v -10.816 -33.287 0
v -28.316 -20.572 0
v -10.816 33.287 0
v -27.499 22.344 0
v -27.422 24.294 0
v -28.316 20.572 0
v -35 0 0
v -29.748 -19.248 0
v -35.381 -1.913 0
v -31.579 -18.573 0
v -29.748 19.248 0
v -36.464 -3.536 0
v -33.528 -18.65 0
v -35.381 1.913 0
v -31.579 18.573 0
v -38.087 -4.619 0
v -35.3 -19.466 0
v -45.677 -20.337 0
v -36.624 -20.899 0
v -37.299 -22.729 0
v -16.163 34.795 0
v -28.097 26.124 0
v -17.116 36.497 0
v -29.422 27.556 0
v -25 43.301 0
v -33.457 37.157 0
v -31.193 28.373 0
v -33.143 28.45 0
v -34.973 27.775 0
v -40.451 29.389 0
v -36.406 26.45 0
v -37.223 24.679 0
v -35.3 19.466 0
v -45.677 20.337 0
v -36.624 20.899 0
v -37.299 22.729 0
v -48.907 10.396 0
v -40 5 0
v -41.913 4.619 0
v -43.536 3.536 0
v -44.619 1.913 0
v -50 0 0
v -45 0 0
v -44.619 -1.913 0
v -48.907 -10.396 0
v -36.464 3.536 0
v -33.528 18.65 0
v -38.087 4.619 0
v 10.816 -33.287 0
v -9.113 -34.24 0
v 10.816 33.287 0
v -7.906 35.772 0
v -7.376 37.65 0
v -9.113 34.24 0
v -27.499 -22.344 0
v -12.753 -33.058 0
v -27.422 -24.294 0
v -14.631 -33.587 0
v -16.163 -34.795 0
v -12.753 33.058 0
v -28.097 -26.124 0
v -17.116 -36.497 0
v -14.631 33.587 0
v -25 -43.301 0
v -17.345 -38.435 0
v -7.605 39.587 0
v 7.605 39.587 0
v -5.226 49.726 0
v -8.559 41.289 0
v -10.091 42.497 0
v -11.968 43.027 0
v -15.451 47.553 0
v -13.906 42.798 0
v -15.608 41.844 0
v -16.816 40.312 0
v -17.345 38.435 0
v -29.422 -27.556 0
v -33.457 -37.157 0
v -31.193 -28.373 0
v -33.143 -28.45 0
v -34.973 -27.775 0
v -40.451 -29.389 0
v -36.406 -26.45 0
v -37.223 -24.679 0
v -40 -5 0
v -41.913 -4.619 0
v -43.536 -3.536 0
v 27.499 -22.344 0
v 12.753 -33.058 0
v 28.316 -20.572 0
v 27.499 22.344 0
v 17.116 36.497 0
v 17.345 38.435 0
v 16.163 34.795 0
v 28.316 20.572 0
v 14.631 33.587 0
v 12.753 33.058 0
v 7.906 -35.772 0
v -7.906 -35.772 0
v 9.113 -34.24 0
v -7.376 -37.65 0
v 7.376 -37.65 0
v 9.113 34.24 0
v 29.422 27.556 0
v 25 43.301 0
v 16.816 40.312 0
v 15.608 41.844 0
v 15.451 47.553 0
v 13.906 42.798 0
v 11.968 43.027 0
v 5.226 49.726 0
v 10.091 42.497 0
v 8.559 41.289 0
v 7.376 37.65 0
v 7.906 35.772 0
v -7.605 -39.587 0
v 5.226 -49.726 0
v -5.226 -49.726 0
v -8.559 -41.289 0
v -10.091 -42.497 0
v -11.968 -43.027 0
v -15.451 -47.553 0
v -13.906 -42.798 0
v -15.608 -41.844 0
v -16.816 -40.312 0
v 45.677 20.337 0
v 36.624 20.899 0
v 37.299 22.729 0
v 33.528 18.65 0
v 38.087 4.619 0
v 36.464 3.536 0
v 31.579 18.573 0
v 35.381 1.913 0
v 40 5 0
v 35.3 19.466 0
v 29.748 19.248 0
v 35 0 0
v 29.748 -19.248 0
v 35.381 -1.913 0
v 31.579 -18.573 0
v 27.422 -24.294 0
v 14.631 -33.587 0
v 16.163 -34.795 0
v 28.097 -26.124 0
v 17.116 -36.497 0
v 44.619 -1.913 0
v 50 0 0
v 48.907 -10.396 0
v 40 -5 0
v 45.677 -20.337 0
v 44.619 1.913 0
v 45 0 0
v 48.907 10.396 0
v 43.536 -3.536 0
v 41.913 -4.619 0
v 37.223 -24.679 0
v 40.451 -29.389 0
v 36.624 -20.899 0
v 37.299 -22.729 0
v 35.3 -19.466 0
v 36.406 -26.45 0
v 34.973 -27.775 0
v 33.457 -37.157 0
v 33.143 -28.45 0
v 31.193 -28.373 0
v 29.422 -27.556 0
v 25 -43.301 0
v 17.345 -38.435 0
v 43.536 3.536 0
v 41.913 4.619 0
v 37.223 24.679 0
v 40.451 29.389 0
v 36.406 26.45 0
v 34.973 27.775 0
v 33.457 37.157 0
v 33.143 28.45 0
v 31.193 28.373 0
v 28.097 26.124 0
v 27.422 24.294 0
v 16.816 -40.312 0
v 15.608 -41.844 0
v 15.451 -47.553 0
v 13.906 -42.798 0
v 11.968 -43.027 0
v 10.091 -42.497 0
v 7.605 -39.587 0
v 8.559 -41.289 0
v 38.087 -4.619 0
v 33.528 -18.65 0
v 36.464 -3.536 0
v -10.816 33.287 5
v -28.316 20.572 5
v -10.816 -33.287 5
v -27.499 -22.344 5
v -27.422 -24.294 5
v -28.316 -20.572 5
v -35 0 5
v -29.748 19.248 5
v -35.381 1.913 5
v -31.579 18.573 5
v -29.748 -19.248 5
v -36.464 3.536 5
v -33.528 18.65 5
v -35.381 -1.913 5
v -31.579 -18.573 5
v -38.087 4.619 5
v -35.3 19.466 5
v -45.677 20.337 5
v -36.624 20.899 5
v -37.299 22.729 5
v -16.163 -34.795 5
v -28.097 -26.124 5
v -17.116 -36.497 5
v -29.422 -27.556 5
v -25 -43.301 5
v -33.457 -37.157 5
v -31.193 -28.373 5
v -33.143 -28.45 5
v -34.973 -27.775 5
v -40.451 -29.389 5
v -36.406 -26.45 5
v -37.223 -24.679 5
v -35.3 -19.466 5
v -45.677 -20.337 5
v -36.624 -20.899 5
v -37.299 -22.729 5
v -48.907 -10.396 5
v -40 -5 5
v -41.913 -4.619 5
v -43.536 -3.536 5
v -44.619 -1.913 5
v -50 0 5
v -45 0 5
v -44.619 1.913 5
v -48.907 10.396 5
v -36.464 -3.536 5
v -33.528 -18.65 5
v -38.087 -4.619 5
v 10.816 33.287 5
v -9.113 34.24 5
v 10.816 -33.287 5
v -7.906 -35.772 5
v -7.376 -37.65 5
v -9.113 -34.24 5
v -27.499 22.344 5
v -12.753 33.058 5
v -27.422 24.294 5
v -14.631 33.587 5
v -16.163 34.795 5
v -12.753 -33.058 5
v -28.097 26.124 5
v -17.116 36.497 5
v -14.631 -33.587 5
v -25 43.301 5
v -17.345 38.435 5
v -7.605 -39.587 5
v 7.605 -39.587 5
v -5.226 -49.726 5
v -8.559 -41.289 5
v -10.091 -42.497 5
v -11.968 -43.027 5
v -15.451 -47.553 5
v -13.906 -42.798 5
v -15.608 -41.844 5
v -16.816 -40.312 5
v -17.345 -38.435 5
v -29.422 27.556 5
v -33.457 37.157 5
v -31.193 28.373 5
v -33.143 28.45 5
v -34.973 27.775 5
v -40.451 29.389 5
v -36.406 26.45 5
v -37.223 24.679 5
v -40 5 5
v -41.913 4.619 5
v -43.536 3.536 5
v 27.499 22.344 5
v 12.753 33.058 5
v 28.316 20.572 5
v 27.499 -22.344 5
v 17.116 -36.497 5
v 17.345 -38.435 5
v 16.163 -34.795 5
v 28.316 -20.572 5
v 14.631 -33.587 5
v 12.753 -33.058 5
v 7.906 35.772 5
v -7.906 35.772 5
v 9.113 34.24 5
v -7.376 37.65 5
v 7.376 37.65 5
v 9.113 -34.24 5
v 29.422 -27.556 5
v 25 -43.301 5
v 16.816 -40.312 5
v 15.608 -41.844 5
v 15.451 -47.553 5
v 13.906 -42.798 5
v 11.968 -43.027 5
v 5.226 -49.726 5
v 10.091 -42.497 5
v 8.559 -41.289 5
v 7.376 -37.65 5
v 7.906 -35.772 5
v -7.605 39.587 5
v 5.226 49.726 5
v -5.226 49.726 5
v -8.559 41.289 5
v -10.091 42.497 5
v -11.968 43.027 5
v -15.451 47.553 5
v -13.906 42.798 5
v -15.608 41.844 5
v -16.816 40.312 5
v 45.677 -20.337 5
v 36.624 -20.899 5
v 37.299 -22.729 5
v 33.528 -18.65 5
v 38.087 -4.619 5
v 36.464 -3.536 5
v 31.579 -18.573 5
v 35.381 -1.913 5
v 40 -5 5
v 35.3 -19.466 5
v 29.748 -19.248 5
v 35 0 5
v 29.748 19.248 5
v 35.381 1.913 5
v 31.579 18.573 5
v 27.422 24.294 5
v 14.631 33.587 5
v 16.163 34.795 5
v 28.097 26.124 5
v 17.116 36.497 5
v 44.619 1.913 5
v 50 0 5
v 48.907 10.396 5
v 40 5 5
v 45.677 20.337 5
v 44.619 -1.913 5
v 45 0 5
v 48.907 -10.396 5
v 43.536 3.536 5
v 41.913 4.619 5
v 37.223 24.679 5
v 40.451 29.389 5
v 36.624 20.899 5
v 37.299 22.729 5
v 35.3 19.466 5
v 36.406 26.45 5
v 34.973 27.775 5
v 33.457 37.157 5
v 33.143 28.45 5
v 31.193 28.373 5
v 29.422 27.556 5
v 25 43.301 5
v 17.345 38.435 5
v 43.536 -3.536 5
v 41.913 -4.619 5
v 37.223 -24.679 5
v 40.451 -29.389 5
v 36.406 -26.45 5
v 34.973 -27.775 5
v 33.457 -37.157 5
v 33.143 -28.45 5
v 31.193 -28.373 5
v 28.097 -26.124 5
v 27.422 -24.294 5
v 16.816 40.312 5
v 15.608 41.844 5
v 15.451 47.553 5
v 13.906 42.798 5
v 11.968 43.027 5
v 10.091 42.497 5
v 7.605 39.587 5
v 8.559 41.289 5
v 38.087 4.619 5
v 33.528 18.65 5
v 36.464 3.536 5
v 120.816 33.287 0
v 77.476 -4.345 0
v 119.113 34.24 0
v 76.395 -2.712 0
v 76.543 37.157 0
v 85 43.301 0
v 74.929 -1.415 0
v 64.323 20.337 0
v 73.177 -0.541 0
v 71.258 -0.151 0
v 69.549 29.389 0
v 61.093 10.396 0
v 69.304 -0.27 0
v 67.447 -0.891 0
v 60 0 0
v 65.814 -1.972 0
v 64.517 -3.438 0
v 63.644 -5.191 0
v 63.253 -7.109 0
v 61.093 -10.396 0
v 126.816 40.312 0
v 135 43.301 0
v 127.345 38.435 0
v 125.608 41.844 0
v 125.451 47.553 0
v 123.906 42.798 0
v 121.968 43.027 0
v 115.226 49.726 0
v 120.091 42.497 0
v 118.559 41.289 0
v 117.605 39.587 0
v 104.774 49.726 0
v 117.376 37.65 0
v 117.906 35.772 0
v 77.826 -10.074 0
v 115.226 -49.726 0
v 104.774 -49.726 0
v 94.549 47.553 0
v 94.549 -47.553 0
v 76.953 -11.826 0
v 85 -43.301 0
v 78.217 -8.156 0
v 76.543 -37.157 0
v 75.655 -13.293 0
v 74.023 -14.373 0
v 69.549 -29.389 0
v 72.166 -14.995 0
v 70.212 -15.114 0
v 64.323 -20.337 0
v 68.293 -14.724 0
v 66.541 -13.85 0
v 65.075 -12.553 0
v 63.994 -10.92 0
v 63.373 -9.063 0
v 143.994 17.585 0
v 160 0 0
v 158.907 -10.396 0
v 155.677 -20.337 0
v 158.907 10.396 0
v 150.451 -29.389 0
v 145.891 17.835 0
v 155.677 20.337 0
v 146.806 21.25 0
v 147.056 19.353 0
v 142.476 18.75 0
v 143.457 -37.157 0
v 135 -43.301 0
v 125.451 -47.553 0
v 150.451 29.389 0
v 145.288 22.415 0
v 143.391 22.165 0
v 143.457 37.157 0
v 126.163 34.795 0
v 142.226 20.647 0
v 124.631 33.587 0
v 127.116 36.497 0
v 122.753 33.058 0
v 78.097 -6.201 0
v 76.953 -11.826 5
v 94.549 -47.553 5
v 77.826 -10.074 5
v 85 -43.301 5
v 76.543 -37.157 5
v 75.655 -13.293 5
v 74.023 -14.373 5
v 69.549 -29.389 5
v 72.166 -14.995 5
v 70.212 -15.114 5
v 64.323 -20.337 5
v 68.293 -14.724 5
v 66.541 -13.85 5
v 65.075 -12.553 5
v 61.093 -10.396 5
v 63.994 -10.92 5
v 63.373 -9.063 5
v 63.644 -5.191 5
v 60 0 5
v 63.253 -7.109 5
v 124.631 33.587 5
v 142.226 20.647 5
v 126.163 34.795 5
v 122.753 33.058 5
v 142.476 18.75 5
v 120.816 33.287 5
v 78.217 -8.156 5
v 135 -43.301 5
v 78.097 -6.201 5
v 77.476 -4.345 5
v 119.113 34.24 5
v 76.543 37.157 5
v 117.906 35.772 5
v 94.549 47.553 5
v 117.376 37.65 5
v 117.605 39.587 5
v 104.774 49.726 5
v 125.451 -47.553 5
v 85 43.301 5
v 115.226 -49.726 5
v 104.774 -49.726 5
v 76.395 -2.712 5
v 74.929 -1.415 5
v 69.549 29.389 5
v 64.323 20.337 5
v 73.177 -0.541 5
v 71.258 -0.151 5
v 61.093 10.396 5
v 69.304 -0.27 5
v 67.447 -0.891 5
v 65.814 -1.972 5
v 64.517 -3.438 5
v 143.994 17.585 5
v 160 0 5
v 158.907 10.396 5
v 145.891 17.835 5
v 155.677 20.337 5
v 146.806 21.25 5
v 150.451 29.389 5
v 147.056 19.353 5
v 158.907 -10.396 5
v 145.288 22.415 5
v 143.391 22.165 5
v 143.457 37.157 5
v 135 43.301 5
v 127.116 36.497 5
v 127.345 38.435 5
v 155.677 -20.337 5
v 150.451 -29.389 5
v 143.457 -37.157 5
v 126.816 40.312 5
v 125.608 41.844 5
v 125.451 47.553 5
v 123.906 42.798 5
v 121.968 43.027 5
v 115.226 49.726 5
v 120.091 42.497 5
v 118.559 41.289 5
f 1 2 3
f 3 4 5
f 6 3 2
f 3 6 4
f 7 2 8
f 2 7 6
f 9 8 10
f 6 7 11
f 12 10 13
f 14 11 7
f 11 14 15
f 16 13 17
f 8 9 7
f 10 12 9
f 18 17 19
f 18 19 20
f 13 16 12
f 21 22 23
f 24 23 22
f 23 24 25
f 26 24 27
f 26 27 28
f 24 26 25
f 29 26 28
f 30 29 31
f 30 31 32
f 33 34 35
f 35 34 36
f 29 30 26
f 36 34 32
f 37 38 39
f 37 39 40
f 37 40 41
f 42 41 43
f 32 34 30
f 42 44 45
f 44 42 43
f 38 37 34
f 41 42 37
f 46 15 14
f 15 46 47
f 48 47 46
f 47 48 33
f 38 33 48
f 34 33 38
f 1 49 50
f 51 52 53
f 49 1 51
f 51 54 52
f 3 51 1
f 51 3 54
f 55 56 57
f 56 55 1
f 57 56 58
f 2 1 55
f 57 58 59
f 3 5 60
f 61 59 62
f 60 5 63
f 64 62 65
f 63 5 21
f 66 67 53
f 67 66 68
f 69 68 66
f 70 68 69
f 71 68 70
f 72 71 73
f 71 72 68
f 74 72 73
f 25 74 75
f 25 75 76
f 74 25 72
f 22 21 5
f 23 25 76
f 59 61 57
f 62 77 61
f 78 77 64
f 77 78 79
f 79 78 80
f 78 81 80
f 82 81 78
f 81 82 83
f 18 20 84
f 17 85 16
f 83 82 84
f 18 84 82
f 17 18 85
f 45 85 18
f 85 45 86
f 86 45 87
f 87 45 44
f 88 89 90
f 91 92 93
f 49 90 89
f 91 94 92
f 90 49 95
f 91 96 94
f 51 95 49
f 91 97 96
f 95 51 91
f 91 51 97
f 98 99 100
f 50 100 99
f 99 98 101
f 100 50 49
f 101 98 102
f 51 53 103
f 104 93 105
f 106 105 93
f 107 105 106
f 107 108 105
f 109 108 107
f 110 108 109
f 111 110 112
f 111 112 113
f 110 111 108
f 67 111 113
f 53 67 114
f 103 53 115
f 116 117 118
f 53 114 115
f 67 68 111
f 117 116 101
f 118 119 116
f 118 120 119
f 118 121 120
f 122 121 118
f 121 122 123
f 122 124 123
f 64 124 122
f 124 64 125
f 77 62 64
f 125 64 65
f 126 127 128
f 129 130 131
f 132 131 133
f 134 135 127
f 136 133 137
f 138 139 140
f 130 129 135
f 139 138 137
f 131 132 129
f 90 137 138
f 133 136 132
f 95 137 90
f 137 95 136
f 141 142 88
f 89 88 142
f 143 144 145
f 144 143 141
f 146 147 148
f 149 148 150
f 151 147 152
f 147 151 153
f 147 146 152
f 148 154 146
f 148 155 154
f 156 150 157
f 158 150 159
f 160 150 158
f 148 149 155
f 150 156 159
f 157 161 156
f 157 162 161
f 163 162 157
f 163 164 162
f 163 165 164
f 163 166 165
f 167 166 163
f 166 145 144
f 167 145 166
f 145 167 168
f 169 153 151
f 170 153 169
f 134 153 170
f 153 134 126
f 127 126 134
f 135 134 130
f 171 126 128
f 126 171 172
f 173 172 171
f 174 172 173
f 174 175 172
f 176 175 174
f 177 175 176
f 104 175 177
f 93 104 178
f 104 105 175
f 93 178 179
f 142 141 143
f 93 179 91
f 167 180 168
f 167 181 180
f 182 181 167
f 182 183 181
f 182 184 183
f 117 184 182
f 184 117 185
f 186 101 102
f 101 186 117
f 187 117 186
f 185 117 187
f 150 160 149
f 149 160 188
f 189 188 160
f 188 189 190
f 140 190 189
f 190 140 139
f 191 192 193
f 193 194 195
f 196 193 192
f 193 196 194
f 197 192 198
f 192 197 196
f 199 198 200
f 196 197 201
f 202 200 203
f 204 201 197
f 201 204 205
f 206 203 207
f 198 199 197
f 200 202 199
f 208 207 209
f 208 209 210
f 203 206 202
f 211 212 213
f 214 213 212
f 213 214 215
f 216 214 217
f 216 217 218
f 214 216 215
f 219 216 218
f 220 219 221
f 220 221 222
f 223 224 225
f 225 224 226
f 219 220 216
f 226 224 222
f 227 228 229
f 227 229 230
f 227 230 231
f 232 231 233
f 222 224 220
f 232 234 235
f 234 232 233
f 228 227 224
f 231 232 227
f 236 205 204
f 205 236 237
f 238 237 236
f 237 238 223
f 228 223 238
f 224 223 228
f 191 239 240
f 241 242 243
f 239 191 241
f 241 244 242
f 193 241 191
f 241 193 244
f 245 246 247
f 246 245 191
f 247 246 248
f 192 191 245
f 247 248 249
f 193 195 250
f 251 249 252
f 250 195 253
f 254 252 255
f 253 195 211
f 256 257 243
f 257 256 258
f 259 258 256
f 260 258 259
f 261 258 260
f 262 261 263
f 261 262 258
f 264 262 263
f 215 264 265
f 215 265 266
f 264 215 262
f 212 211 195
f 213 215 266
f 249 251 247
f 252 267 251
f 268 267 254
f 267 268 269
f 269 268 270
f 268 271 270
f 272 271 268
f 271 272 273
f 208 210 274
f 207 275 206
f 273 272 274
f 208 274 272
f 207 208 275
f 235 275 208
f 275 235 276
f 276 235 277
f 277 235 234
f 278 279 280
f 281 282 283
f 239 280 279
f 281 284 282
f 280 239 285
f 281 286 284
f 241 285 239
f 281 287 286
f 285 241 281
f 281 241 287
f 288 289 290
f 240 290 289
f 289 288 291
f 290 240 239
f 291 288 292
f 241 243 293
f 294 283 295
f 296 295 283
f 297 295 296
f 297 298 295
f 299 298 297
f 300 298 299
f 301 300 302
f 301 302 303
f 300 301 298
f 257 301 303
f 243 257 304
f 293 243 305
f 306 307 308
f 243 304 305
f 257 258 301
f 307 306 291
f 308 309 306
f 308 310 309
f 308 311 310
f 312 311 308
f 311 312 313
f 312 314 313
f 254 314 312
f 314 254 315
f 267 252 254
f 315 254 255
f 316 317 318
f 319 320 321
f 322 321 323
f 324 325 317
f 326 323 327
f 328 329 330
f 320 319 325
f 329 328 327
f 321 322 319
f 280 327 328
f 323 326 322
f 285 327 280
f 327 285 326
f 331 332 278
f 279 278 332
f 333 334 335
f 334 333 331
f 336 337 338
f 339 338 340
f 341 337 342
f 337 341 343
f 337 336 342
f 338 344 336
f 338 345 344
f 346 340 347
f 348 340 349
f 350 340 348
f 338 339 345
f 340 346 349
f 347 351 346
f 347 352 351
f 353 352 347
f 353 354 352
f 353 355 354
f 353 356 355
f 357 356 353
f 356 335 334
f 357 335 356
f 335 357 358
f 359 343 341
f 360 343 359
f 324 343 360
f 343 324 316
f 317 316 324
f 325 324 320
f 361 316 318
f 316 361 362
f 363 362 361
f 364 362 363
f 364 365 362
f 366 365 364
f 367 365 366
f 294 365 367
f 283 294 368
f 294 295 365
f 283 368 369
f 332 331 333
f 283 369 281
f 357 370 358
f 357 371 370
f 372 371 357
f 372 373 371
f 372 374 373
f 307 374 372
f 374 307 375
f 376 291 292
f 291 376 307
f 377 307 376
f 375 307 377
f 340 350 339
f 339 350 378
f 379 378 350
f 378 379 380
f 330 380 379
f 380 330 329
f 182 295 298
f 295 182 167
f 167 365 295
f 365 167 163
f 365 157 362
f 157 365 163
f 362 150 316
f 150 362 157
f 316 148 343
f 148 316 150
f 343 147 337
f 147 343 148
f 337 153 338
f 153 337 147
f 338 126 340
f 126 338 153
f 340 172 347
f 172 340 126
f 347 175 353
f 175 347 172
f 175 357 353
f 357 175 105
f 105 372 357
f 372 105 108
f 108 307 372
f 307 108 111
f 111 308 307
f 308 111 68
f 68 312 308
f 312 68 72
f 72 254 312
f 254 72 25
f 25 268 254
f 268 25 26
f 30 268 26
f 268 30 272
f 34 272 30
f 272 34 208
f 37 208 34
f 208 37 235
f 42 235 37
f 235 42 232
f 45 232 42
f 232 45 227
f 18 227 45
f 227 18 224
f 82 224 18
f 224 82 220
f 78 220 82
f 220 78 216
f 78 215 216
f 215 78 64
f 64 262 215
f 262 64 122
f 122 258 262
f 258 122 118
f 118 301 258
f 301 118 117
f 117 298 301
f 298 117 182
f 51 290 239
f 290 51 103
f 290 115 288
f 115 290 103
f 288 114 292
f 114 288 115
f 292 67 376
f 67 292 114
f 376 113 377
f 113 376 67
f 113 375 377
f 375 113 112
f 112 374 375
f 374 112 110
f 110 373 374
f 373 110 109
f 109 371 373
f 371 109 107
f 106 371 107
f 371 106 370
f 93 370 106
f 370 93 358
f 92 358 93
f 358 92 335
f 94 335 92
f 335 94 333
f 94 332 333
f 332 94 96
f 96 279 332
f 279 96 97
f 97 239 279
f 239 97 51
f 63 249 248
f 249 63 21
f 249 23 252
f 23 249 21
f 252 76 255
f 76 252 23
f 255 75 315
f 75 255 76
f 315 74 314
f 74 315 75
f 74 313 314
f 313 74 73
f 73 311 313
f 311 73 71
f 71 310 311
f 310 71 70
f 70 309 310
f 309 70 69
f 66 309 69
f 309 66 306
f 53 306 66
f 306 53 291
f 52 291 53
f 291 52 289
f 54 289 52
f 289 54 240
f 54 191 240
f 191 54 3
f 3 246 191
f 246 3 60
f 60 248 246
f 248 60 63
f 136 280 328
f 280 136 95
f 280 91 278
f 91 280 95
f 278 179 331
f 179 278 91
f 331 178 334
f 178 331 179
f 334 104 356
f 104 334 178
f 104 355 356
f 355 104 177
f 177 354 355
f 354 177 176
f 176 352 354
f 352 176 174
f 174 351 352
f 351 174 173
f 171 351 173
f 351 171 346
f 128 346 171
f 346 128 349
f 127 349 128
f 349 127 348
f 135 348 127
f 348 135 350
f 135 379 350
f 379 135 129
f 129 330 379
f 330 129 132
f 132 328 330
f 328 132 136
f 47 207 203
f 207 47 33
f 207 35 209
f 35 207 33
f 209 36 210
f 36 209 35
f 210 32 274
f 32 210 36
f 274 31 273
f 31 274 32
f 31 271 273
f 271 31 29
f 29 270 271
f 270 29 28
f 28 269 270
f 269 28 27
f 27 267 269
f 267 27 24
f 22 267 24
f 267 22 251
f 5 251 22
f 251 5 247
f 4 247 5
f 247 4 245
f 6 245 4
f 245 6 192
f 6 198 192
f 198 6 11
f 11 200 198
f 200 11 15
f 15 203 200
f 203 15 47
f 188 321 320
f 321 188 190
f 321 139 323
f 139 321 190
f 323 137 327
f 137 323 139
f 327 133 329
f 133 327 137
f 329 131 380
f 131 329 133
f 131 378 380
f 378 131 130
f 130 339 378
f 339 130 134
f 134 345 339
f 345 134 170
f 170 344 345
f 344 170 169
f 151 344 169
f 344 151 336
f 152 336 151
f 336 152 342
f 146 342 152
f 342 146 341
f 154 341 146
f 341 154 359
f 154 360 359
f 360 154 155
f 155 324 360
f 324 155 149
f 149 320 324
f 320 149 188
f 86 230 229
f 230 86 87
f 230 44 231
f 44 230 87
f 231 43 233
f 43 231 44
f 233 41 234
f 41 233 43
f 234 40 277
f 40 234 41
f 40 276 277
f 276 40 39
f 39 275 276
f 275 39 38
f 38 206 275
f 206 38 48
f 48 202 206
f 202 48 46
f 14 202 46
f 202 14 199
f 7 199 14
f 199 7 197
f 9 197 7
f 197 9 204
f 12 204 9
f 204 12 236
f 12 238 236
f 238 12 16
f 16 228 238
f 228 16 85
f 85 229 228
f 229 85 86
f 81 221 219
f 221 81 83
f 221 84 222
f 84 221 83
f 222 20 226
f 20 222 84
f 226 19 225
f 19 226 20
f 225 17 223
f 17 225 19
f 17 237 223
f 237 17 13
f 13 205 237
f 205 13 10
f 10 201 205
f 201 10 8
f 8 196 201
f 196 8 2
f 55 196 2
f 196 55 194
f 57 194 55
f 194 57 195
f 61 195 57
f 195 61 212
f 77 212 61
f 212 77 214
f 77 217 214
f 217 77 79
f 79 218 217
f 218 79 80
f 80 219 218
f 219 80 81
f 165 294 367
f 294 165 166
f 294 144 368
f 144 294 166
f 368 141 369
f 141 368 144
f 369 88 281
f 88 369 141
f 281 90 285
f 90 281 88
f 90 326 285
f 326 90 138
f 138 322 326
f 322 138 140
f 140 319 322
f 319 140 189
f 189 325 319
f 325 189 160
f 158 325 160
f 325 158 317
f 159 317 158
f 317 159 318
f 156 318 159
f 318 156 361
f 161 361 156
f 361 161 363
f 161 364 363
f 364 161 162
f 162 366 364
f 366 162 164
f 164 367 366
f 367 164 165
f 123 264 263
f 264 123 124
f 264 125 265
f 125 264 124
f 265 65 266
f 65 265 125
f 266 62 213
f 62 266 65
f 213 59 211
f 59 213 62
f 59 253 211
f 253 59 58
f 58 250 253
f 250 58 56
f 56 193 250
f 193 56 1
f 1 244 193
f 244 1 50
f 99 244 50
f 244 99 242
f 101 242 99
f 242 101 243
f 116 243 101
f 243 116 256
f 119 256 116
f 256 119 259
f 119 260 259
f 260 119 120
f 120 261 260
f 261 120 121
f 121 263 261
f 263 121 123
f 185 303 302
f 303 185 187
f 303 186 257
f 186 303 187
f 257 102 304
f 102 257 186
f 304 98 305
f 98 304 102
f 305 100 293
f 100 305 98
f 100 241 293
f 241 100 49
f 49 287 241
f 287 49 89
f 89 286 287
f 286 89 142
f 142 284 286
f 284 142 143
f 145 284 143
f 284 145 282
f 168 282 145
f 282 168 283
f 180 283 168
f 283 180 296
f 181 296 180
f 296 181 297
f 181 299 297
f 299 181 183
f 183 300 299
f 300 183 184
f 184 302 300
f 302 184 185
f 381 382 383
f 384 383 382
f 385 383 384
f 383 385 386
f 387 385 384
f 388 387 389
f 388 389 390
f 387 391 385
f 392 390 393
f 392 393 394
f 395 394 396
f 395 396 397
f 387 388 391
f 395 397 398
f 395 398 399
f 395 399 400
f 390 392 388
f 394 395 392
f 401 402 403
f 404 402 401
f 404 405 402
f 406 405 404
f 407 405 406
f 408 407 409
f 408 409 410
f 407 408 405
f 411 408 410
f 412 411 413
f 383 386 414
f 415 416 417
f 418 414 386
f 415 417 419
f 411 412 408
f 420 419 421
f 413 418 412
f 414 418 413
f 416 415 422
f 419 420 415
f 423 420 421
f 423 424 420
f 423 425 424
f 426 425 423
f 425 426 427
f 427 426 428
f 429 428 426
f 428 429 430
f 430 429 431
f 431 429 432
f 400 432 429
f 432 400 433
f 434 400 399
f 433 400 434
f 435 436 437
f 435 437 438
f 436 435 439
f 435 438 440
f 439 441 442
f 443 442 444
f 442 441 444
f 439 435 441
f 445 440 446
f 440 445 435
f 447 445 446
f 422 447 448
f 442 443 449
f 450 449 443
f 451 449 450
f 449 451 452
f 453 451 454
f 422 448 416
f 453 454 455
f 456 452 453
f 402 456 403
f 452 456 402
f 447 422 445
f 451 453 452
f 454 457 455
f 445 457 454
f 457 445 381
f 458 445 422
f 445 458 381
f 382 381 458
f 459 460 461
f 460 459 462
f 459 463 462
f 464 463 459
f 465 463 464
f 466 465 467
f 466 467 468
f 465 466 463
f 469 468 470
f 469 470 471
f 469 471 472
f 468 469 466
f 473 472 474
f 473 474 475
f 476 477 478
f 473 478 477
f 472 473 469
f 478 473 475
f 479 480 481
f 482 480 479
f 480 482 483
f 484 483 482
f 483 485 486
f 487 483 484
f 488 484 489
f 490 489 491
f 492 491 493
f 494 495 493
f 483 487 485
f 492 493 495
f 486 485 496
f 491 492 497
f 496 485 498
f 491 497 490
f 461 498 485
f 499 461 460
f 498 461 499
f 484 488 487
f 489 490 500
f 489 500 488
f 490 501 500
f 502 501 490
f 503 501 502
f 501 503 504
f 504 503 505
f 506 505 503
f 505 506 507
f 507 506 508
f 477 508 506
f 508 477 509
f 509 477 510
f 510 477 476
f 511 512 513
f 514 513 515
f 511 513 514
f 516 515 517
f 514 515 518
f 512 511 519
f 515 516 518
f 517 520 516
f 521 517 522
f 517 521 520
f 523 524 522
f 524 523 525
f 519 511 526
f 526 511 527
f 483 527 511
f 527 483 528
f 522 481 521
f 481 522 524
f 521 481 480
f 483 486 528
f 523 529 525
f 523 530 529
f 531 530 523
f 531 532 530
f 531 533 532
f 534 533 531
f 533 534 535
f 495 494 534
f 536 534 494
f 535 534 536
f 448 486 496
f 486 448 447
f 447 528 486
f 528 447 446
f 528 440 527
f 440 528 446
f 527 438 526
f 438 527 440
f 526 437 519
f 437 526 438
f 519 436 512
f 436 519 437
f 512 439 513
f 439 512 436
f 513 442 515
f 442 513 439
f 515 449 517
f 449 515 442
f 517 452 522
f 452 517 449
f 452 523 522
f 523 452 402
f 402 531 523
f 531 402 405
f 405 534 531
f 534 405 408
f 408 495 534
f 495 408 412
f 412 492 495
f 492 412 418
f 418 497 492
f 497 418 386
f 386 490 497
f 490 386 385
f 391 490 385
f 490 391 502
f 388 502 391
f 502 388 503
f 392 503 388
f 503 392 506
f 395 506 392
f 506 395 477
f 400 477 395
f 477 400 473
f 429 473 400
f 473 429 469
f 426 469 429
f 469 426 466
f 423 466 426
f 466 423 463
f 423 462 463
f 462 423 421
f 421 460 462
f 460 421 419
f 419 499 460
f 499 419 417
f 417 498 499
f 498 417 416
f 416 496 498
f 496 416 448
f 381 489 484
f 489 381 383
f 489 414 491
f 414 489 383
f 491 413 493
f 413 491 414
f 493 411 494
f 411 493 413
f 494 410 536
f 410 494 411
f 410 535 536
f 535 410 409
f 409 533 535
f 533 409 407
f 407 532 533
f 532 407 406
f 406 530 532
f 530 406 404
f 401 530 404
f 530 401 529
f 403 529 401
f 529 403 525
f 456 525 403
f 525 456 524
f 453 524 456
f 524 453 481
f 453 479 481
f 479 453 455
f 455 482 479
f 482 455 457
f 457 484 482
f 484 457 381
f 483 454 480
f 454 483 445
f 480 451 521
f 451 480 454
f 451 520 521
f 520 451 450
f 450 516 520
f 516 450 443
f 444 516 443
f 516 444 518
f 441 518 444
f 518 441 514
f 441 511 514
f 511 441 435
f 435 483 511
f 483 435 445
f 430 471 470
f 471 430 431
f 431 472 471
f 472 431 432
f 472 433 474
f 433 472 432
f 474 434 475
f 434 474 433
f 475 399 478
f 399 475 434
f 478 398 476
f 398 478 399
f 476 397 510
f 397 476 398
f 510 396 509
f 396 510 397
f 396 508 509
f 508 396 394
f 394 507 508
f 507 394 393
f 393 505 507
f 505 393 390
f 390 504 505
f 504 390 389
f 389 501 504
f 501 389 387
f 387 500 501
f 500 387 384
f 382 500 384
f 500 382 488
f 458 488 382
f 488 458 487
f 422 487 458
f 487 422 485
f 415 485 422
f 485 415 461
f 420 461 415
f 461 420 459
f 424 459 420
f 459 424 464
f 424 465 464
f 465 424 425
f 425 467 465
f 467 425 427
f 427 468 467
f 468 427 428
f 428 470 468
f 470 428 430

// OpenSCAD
// Big disc, now using variables

DiscDiamater = 100;
DiscRadius = DiscDiamater / 2;
DiscThickness = 5;
NumberOfHoles = 10;
HoleInset = 10;
HoleDiameter = 10;
HoleRadius = HoleDiameter / 2;

linear_extrude(DiscThickness)
	difference() {
		// the big circle
		circle(DiscRadius);
		
		// holes round the edge, formed using a for loop
		for (i=[0:NumberOfHoles-1])  // the colon specifies this is a range
			rotate([0, 0, i* 360/NumberOfHoles]) 
			translate([DiscRadius - HoleInset, 0, 0])
			circle(HoleRadius);
	}




// A more complex example, showing use of arrays in variables

HolesAtSpecificAngles 	= 3;
HoleAngles 				= [30, 72, 191];
HoleDiameters 			= [5, 10, 15];

translate([DiscDiamater + 10, 0, 0]) // translate this example off along x+
	linear_extrude(DiscThickness)
	difference() {
		// the big circle
		circle(DiscRadius);
		
		// 
		for (i=[0:HolesAtSpecificAngles-1]) 
			rotate([0, 0, HoleAngles[i] ])  // using the loop index i to access the array of specific angles
			translate([DiscRadius - HoleInset, 0, 0])
			circle( HoleDiameters[i] / 2 );
	}
